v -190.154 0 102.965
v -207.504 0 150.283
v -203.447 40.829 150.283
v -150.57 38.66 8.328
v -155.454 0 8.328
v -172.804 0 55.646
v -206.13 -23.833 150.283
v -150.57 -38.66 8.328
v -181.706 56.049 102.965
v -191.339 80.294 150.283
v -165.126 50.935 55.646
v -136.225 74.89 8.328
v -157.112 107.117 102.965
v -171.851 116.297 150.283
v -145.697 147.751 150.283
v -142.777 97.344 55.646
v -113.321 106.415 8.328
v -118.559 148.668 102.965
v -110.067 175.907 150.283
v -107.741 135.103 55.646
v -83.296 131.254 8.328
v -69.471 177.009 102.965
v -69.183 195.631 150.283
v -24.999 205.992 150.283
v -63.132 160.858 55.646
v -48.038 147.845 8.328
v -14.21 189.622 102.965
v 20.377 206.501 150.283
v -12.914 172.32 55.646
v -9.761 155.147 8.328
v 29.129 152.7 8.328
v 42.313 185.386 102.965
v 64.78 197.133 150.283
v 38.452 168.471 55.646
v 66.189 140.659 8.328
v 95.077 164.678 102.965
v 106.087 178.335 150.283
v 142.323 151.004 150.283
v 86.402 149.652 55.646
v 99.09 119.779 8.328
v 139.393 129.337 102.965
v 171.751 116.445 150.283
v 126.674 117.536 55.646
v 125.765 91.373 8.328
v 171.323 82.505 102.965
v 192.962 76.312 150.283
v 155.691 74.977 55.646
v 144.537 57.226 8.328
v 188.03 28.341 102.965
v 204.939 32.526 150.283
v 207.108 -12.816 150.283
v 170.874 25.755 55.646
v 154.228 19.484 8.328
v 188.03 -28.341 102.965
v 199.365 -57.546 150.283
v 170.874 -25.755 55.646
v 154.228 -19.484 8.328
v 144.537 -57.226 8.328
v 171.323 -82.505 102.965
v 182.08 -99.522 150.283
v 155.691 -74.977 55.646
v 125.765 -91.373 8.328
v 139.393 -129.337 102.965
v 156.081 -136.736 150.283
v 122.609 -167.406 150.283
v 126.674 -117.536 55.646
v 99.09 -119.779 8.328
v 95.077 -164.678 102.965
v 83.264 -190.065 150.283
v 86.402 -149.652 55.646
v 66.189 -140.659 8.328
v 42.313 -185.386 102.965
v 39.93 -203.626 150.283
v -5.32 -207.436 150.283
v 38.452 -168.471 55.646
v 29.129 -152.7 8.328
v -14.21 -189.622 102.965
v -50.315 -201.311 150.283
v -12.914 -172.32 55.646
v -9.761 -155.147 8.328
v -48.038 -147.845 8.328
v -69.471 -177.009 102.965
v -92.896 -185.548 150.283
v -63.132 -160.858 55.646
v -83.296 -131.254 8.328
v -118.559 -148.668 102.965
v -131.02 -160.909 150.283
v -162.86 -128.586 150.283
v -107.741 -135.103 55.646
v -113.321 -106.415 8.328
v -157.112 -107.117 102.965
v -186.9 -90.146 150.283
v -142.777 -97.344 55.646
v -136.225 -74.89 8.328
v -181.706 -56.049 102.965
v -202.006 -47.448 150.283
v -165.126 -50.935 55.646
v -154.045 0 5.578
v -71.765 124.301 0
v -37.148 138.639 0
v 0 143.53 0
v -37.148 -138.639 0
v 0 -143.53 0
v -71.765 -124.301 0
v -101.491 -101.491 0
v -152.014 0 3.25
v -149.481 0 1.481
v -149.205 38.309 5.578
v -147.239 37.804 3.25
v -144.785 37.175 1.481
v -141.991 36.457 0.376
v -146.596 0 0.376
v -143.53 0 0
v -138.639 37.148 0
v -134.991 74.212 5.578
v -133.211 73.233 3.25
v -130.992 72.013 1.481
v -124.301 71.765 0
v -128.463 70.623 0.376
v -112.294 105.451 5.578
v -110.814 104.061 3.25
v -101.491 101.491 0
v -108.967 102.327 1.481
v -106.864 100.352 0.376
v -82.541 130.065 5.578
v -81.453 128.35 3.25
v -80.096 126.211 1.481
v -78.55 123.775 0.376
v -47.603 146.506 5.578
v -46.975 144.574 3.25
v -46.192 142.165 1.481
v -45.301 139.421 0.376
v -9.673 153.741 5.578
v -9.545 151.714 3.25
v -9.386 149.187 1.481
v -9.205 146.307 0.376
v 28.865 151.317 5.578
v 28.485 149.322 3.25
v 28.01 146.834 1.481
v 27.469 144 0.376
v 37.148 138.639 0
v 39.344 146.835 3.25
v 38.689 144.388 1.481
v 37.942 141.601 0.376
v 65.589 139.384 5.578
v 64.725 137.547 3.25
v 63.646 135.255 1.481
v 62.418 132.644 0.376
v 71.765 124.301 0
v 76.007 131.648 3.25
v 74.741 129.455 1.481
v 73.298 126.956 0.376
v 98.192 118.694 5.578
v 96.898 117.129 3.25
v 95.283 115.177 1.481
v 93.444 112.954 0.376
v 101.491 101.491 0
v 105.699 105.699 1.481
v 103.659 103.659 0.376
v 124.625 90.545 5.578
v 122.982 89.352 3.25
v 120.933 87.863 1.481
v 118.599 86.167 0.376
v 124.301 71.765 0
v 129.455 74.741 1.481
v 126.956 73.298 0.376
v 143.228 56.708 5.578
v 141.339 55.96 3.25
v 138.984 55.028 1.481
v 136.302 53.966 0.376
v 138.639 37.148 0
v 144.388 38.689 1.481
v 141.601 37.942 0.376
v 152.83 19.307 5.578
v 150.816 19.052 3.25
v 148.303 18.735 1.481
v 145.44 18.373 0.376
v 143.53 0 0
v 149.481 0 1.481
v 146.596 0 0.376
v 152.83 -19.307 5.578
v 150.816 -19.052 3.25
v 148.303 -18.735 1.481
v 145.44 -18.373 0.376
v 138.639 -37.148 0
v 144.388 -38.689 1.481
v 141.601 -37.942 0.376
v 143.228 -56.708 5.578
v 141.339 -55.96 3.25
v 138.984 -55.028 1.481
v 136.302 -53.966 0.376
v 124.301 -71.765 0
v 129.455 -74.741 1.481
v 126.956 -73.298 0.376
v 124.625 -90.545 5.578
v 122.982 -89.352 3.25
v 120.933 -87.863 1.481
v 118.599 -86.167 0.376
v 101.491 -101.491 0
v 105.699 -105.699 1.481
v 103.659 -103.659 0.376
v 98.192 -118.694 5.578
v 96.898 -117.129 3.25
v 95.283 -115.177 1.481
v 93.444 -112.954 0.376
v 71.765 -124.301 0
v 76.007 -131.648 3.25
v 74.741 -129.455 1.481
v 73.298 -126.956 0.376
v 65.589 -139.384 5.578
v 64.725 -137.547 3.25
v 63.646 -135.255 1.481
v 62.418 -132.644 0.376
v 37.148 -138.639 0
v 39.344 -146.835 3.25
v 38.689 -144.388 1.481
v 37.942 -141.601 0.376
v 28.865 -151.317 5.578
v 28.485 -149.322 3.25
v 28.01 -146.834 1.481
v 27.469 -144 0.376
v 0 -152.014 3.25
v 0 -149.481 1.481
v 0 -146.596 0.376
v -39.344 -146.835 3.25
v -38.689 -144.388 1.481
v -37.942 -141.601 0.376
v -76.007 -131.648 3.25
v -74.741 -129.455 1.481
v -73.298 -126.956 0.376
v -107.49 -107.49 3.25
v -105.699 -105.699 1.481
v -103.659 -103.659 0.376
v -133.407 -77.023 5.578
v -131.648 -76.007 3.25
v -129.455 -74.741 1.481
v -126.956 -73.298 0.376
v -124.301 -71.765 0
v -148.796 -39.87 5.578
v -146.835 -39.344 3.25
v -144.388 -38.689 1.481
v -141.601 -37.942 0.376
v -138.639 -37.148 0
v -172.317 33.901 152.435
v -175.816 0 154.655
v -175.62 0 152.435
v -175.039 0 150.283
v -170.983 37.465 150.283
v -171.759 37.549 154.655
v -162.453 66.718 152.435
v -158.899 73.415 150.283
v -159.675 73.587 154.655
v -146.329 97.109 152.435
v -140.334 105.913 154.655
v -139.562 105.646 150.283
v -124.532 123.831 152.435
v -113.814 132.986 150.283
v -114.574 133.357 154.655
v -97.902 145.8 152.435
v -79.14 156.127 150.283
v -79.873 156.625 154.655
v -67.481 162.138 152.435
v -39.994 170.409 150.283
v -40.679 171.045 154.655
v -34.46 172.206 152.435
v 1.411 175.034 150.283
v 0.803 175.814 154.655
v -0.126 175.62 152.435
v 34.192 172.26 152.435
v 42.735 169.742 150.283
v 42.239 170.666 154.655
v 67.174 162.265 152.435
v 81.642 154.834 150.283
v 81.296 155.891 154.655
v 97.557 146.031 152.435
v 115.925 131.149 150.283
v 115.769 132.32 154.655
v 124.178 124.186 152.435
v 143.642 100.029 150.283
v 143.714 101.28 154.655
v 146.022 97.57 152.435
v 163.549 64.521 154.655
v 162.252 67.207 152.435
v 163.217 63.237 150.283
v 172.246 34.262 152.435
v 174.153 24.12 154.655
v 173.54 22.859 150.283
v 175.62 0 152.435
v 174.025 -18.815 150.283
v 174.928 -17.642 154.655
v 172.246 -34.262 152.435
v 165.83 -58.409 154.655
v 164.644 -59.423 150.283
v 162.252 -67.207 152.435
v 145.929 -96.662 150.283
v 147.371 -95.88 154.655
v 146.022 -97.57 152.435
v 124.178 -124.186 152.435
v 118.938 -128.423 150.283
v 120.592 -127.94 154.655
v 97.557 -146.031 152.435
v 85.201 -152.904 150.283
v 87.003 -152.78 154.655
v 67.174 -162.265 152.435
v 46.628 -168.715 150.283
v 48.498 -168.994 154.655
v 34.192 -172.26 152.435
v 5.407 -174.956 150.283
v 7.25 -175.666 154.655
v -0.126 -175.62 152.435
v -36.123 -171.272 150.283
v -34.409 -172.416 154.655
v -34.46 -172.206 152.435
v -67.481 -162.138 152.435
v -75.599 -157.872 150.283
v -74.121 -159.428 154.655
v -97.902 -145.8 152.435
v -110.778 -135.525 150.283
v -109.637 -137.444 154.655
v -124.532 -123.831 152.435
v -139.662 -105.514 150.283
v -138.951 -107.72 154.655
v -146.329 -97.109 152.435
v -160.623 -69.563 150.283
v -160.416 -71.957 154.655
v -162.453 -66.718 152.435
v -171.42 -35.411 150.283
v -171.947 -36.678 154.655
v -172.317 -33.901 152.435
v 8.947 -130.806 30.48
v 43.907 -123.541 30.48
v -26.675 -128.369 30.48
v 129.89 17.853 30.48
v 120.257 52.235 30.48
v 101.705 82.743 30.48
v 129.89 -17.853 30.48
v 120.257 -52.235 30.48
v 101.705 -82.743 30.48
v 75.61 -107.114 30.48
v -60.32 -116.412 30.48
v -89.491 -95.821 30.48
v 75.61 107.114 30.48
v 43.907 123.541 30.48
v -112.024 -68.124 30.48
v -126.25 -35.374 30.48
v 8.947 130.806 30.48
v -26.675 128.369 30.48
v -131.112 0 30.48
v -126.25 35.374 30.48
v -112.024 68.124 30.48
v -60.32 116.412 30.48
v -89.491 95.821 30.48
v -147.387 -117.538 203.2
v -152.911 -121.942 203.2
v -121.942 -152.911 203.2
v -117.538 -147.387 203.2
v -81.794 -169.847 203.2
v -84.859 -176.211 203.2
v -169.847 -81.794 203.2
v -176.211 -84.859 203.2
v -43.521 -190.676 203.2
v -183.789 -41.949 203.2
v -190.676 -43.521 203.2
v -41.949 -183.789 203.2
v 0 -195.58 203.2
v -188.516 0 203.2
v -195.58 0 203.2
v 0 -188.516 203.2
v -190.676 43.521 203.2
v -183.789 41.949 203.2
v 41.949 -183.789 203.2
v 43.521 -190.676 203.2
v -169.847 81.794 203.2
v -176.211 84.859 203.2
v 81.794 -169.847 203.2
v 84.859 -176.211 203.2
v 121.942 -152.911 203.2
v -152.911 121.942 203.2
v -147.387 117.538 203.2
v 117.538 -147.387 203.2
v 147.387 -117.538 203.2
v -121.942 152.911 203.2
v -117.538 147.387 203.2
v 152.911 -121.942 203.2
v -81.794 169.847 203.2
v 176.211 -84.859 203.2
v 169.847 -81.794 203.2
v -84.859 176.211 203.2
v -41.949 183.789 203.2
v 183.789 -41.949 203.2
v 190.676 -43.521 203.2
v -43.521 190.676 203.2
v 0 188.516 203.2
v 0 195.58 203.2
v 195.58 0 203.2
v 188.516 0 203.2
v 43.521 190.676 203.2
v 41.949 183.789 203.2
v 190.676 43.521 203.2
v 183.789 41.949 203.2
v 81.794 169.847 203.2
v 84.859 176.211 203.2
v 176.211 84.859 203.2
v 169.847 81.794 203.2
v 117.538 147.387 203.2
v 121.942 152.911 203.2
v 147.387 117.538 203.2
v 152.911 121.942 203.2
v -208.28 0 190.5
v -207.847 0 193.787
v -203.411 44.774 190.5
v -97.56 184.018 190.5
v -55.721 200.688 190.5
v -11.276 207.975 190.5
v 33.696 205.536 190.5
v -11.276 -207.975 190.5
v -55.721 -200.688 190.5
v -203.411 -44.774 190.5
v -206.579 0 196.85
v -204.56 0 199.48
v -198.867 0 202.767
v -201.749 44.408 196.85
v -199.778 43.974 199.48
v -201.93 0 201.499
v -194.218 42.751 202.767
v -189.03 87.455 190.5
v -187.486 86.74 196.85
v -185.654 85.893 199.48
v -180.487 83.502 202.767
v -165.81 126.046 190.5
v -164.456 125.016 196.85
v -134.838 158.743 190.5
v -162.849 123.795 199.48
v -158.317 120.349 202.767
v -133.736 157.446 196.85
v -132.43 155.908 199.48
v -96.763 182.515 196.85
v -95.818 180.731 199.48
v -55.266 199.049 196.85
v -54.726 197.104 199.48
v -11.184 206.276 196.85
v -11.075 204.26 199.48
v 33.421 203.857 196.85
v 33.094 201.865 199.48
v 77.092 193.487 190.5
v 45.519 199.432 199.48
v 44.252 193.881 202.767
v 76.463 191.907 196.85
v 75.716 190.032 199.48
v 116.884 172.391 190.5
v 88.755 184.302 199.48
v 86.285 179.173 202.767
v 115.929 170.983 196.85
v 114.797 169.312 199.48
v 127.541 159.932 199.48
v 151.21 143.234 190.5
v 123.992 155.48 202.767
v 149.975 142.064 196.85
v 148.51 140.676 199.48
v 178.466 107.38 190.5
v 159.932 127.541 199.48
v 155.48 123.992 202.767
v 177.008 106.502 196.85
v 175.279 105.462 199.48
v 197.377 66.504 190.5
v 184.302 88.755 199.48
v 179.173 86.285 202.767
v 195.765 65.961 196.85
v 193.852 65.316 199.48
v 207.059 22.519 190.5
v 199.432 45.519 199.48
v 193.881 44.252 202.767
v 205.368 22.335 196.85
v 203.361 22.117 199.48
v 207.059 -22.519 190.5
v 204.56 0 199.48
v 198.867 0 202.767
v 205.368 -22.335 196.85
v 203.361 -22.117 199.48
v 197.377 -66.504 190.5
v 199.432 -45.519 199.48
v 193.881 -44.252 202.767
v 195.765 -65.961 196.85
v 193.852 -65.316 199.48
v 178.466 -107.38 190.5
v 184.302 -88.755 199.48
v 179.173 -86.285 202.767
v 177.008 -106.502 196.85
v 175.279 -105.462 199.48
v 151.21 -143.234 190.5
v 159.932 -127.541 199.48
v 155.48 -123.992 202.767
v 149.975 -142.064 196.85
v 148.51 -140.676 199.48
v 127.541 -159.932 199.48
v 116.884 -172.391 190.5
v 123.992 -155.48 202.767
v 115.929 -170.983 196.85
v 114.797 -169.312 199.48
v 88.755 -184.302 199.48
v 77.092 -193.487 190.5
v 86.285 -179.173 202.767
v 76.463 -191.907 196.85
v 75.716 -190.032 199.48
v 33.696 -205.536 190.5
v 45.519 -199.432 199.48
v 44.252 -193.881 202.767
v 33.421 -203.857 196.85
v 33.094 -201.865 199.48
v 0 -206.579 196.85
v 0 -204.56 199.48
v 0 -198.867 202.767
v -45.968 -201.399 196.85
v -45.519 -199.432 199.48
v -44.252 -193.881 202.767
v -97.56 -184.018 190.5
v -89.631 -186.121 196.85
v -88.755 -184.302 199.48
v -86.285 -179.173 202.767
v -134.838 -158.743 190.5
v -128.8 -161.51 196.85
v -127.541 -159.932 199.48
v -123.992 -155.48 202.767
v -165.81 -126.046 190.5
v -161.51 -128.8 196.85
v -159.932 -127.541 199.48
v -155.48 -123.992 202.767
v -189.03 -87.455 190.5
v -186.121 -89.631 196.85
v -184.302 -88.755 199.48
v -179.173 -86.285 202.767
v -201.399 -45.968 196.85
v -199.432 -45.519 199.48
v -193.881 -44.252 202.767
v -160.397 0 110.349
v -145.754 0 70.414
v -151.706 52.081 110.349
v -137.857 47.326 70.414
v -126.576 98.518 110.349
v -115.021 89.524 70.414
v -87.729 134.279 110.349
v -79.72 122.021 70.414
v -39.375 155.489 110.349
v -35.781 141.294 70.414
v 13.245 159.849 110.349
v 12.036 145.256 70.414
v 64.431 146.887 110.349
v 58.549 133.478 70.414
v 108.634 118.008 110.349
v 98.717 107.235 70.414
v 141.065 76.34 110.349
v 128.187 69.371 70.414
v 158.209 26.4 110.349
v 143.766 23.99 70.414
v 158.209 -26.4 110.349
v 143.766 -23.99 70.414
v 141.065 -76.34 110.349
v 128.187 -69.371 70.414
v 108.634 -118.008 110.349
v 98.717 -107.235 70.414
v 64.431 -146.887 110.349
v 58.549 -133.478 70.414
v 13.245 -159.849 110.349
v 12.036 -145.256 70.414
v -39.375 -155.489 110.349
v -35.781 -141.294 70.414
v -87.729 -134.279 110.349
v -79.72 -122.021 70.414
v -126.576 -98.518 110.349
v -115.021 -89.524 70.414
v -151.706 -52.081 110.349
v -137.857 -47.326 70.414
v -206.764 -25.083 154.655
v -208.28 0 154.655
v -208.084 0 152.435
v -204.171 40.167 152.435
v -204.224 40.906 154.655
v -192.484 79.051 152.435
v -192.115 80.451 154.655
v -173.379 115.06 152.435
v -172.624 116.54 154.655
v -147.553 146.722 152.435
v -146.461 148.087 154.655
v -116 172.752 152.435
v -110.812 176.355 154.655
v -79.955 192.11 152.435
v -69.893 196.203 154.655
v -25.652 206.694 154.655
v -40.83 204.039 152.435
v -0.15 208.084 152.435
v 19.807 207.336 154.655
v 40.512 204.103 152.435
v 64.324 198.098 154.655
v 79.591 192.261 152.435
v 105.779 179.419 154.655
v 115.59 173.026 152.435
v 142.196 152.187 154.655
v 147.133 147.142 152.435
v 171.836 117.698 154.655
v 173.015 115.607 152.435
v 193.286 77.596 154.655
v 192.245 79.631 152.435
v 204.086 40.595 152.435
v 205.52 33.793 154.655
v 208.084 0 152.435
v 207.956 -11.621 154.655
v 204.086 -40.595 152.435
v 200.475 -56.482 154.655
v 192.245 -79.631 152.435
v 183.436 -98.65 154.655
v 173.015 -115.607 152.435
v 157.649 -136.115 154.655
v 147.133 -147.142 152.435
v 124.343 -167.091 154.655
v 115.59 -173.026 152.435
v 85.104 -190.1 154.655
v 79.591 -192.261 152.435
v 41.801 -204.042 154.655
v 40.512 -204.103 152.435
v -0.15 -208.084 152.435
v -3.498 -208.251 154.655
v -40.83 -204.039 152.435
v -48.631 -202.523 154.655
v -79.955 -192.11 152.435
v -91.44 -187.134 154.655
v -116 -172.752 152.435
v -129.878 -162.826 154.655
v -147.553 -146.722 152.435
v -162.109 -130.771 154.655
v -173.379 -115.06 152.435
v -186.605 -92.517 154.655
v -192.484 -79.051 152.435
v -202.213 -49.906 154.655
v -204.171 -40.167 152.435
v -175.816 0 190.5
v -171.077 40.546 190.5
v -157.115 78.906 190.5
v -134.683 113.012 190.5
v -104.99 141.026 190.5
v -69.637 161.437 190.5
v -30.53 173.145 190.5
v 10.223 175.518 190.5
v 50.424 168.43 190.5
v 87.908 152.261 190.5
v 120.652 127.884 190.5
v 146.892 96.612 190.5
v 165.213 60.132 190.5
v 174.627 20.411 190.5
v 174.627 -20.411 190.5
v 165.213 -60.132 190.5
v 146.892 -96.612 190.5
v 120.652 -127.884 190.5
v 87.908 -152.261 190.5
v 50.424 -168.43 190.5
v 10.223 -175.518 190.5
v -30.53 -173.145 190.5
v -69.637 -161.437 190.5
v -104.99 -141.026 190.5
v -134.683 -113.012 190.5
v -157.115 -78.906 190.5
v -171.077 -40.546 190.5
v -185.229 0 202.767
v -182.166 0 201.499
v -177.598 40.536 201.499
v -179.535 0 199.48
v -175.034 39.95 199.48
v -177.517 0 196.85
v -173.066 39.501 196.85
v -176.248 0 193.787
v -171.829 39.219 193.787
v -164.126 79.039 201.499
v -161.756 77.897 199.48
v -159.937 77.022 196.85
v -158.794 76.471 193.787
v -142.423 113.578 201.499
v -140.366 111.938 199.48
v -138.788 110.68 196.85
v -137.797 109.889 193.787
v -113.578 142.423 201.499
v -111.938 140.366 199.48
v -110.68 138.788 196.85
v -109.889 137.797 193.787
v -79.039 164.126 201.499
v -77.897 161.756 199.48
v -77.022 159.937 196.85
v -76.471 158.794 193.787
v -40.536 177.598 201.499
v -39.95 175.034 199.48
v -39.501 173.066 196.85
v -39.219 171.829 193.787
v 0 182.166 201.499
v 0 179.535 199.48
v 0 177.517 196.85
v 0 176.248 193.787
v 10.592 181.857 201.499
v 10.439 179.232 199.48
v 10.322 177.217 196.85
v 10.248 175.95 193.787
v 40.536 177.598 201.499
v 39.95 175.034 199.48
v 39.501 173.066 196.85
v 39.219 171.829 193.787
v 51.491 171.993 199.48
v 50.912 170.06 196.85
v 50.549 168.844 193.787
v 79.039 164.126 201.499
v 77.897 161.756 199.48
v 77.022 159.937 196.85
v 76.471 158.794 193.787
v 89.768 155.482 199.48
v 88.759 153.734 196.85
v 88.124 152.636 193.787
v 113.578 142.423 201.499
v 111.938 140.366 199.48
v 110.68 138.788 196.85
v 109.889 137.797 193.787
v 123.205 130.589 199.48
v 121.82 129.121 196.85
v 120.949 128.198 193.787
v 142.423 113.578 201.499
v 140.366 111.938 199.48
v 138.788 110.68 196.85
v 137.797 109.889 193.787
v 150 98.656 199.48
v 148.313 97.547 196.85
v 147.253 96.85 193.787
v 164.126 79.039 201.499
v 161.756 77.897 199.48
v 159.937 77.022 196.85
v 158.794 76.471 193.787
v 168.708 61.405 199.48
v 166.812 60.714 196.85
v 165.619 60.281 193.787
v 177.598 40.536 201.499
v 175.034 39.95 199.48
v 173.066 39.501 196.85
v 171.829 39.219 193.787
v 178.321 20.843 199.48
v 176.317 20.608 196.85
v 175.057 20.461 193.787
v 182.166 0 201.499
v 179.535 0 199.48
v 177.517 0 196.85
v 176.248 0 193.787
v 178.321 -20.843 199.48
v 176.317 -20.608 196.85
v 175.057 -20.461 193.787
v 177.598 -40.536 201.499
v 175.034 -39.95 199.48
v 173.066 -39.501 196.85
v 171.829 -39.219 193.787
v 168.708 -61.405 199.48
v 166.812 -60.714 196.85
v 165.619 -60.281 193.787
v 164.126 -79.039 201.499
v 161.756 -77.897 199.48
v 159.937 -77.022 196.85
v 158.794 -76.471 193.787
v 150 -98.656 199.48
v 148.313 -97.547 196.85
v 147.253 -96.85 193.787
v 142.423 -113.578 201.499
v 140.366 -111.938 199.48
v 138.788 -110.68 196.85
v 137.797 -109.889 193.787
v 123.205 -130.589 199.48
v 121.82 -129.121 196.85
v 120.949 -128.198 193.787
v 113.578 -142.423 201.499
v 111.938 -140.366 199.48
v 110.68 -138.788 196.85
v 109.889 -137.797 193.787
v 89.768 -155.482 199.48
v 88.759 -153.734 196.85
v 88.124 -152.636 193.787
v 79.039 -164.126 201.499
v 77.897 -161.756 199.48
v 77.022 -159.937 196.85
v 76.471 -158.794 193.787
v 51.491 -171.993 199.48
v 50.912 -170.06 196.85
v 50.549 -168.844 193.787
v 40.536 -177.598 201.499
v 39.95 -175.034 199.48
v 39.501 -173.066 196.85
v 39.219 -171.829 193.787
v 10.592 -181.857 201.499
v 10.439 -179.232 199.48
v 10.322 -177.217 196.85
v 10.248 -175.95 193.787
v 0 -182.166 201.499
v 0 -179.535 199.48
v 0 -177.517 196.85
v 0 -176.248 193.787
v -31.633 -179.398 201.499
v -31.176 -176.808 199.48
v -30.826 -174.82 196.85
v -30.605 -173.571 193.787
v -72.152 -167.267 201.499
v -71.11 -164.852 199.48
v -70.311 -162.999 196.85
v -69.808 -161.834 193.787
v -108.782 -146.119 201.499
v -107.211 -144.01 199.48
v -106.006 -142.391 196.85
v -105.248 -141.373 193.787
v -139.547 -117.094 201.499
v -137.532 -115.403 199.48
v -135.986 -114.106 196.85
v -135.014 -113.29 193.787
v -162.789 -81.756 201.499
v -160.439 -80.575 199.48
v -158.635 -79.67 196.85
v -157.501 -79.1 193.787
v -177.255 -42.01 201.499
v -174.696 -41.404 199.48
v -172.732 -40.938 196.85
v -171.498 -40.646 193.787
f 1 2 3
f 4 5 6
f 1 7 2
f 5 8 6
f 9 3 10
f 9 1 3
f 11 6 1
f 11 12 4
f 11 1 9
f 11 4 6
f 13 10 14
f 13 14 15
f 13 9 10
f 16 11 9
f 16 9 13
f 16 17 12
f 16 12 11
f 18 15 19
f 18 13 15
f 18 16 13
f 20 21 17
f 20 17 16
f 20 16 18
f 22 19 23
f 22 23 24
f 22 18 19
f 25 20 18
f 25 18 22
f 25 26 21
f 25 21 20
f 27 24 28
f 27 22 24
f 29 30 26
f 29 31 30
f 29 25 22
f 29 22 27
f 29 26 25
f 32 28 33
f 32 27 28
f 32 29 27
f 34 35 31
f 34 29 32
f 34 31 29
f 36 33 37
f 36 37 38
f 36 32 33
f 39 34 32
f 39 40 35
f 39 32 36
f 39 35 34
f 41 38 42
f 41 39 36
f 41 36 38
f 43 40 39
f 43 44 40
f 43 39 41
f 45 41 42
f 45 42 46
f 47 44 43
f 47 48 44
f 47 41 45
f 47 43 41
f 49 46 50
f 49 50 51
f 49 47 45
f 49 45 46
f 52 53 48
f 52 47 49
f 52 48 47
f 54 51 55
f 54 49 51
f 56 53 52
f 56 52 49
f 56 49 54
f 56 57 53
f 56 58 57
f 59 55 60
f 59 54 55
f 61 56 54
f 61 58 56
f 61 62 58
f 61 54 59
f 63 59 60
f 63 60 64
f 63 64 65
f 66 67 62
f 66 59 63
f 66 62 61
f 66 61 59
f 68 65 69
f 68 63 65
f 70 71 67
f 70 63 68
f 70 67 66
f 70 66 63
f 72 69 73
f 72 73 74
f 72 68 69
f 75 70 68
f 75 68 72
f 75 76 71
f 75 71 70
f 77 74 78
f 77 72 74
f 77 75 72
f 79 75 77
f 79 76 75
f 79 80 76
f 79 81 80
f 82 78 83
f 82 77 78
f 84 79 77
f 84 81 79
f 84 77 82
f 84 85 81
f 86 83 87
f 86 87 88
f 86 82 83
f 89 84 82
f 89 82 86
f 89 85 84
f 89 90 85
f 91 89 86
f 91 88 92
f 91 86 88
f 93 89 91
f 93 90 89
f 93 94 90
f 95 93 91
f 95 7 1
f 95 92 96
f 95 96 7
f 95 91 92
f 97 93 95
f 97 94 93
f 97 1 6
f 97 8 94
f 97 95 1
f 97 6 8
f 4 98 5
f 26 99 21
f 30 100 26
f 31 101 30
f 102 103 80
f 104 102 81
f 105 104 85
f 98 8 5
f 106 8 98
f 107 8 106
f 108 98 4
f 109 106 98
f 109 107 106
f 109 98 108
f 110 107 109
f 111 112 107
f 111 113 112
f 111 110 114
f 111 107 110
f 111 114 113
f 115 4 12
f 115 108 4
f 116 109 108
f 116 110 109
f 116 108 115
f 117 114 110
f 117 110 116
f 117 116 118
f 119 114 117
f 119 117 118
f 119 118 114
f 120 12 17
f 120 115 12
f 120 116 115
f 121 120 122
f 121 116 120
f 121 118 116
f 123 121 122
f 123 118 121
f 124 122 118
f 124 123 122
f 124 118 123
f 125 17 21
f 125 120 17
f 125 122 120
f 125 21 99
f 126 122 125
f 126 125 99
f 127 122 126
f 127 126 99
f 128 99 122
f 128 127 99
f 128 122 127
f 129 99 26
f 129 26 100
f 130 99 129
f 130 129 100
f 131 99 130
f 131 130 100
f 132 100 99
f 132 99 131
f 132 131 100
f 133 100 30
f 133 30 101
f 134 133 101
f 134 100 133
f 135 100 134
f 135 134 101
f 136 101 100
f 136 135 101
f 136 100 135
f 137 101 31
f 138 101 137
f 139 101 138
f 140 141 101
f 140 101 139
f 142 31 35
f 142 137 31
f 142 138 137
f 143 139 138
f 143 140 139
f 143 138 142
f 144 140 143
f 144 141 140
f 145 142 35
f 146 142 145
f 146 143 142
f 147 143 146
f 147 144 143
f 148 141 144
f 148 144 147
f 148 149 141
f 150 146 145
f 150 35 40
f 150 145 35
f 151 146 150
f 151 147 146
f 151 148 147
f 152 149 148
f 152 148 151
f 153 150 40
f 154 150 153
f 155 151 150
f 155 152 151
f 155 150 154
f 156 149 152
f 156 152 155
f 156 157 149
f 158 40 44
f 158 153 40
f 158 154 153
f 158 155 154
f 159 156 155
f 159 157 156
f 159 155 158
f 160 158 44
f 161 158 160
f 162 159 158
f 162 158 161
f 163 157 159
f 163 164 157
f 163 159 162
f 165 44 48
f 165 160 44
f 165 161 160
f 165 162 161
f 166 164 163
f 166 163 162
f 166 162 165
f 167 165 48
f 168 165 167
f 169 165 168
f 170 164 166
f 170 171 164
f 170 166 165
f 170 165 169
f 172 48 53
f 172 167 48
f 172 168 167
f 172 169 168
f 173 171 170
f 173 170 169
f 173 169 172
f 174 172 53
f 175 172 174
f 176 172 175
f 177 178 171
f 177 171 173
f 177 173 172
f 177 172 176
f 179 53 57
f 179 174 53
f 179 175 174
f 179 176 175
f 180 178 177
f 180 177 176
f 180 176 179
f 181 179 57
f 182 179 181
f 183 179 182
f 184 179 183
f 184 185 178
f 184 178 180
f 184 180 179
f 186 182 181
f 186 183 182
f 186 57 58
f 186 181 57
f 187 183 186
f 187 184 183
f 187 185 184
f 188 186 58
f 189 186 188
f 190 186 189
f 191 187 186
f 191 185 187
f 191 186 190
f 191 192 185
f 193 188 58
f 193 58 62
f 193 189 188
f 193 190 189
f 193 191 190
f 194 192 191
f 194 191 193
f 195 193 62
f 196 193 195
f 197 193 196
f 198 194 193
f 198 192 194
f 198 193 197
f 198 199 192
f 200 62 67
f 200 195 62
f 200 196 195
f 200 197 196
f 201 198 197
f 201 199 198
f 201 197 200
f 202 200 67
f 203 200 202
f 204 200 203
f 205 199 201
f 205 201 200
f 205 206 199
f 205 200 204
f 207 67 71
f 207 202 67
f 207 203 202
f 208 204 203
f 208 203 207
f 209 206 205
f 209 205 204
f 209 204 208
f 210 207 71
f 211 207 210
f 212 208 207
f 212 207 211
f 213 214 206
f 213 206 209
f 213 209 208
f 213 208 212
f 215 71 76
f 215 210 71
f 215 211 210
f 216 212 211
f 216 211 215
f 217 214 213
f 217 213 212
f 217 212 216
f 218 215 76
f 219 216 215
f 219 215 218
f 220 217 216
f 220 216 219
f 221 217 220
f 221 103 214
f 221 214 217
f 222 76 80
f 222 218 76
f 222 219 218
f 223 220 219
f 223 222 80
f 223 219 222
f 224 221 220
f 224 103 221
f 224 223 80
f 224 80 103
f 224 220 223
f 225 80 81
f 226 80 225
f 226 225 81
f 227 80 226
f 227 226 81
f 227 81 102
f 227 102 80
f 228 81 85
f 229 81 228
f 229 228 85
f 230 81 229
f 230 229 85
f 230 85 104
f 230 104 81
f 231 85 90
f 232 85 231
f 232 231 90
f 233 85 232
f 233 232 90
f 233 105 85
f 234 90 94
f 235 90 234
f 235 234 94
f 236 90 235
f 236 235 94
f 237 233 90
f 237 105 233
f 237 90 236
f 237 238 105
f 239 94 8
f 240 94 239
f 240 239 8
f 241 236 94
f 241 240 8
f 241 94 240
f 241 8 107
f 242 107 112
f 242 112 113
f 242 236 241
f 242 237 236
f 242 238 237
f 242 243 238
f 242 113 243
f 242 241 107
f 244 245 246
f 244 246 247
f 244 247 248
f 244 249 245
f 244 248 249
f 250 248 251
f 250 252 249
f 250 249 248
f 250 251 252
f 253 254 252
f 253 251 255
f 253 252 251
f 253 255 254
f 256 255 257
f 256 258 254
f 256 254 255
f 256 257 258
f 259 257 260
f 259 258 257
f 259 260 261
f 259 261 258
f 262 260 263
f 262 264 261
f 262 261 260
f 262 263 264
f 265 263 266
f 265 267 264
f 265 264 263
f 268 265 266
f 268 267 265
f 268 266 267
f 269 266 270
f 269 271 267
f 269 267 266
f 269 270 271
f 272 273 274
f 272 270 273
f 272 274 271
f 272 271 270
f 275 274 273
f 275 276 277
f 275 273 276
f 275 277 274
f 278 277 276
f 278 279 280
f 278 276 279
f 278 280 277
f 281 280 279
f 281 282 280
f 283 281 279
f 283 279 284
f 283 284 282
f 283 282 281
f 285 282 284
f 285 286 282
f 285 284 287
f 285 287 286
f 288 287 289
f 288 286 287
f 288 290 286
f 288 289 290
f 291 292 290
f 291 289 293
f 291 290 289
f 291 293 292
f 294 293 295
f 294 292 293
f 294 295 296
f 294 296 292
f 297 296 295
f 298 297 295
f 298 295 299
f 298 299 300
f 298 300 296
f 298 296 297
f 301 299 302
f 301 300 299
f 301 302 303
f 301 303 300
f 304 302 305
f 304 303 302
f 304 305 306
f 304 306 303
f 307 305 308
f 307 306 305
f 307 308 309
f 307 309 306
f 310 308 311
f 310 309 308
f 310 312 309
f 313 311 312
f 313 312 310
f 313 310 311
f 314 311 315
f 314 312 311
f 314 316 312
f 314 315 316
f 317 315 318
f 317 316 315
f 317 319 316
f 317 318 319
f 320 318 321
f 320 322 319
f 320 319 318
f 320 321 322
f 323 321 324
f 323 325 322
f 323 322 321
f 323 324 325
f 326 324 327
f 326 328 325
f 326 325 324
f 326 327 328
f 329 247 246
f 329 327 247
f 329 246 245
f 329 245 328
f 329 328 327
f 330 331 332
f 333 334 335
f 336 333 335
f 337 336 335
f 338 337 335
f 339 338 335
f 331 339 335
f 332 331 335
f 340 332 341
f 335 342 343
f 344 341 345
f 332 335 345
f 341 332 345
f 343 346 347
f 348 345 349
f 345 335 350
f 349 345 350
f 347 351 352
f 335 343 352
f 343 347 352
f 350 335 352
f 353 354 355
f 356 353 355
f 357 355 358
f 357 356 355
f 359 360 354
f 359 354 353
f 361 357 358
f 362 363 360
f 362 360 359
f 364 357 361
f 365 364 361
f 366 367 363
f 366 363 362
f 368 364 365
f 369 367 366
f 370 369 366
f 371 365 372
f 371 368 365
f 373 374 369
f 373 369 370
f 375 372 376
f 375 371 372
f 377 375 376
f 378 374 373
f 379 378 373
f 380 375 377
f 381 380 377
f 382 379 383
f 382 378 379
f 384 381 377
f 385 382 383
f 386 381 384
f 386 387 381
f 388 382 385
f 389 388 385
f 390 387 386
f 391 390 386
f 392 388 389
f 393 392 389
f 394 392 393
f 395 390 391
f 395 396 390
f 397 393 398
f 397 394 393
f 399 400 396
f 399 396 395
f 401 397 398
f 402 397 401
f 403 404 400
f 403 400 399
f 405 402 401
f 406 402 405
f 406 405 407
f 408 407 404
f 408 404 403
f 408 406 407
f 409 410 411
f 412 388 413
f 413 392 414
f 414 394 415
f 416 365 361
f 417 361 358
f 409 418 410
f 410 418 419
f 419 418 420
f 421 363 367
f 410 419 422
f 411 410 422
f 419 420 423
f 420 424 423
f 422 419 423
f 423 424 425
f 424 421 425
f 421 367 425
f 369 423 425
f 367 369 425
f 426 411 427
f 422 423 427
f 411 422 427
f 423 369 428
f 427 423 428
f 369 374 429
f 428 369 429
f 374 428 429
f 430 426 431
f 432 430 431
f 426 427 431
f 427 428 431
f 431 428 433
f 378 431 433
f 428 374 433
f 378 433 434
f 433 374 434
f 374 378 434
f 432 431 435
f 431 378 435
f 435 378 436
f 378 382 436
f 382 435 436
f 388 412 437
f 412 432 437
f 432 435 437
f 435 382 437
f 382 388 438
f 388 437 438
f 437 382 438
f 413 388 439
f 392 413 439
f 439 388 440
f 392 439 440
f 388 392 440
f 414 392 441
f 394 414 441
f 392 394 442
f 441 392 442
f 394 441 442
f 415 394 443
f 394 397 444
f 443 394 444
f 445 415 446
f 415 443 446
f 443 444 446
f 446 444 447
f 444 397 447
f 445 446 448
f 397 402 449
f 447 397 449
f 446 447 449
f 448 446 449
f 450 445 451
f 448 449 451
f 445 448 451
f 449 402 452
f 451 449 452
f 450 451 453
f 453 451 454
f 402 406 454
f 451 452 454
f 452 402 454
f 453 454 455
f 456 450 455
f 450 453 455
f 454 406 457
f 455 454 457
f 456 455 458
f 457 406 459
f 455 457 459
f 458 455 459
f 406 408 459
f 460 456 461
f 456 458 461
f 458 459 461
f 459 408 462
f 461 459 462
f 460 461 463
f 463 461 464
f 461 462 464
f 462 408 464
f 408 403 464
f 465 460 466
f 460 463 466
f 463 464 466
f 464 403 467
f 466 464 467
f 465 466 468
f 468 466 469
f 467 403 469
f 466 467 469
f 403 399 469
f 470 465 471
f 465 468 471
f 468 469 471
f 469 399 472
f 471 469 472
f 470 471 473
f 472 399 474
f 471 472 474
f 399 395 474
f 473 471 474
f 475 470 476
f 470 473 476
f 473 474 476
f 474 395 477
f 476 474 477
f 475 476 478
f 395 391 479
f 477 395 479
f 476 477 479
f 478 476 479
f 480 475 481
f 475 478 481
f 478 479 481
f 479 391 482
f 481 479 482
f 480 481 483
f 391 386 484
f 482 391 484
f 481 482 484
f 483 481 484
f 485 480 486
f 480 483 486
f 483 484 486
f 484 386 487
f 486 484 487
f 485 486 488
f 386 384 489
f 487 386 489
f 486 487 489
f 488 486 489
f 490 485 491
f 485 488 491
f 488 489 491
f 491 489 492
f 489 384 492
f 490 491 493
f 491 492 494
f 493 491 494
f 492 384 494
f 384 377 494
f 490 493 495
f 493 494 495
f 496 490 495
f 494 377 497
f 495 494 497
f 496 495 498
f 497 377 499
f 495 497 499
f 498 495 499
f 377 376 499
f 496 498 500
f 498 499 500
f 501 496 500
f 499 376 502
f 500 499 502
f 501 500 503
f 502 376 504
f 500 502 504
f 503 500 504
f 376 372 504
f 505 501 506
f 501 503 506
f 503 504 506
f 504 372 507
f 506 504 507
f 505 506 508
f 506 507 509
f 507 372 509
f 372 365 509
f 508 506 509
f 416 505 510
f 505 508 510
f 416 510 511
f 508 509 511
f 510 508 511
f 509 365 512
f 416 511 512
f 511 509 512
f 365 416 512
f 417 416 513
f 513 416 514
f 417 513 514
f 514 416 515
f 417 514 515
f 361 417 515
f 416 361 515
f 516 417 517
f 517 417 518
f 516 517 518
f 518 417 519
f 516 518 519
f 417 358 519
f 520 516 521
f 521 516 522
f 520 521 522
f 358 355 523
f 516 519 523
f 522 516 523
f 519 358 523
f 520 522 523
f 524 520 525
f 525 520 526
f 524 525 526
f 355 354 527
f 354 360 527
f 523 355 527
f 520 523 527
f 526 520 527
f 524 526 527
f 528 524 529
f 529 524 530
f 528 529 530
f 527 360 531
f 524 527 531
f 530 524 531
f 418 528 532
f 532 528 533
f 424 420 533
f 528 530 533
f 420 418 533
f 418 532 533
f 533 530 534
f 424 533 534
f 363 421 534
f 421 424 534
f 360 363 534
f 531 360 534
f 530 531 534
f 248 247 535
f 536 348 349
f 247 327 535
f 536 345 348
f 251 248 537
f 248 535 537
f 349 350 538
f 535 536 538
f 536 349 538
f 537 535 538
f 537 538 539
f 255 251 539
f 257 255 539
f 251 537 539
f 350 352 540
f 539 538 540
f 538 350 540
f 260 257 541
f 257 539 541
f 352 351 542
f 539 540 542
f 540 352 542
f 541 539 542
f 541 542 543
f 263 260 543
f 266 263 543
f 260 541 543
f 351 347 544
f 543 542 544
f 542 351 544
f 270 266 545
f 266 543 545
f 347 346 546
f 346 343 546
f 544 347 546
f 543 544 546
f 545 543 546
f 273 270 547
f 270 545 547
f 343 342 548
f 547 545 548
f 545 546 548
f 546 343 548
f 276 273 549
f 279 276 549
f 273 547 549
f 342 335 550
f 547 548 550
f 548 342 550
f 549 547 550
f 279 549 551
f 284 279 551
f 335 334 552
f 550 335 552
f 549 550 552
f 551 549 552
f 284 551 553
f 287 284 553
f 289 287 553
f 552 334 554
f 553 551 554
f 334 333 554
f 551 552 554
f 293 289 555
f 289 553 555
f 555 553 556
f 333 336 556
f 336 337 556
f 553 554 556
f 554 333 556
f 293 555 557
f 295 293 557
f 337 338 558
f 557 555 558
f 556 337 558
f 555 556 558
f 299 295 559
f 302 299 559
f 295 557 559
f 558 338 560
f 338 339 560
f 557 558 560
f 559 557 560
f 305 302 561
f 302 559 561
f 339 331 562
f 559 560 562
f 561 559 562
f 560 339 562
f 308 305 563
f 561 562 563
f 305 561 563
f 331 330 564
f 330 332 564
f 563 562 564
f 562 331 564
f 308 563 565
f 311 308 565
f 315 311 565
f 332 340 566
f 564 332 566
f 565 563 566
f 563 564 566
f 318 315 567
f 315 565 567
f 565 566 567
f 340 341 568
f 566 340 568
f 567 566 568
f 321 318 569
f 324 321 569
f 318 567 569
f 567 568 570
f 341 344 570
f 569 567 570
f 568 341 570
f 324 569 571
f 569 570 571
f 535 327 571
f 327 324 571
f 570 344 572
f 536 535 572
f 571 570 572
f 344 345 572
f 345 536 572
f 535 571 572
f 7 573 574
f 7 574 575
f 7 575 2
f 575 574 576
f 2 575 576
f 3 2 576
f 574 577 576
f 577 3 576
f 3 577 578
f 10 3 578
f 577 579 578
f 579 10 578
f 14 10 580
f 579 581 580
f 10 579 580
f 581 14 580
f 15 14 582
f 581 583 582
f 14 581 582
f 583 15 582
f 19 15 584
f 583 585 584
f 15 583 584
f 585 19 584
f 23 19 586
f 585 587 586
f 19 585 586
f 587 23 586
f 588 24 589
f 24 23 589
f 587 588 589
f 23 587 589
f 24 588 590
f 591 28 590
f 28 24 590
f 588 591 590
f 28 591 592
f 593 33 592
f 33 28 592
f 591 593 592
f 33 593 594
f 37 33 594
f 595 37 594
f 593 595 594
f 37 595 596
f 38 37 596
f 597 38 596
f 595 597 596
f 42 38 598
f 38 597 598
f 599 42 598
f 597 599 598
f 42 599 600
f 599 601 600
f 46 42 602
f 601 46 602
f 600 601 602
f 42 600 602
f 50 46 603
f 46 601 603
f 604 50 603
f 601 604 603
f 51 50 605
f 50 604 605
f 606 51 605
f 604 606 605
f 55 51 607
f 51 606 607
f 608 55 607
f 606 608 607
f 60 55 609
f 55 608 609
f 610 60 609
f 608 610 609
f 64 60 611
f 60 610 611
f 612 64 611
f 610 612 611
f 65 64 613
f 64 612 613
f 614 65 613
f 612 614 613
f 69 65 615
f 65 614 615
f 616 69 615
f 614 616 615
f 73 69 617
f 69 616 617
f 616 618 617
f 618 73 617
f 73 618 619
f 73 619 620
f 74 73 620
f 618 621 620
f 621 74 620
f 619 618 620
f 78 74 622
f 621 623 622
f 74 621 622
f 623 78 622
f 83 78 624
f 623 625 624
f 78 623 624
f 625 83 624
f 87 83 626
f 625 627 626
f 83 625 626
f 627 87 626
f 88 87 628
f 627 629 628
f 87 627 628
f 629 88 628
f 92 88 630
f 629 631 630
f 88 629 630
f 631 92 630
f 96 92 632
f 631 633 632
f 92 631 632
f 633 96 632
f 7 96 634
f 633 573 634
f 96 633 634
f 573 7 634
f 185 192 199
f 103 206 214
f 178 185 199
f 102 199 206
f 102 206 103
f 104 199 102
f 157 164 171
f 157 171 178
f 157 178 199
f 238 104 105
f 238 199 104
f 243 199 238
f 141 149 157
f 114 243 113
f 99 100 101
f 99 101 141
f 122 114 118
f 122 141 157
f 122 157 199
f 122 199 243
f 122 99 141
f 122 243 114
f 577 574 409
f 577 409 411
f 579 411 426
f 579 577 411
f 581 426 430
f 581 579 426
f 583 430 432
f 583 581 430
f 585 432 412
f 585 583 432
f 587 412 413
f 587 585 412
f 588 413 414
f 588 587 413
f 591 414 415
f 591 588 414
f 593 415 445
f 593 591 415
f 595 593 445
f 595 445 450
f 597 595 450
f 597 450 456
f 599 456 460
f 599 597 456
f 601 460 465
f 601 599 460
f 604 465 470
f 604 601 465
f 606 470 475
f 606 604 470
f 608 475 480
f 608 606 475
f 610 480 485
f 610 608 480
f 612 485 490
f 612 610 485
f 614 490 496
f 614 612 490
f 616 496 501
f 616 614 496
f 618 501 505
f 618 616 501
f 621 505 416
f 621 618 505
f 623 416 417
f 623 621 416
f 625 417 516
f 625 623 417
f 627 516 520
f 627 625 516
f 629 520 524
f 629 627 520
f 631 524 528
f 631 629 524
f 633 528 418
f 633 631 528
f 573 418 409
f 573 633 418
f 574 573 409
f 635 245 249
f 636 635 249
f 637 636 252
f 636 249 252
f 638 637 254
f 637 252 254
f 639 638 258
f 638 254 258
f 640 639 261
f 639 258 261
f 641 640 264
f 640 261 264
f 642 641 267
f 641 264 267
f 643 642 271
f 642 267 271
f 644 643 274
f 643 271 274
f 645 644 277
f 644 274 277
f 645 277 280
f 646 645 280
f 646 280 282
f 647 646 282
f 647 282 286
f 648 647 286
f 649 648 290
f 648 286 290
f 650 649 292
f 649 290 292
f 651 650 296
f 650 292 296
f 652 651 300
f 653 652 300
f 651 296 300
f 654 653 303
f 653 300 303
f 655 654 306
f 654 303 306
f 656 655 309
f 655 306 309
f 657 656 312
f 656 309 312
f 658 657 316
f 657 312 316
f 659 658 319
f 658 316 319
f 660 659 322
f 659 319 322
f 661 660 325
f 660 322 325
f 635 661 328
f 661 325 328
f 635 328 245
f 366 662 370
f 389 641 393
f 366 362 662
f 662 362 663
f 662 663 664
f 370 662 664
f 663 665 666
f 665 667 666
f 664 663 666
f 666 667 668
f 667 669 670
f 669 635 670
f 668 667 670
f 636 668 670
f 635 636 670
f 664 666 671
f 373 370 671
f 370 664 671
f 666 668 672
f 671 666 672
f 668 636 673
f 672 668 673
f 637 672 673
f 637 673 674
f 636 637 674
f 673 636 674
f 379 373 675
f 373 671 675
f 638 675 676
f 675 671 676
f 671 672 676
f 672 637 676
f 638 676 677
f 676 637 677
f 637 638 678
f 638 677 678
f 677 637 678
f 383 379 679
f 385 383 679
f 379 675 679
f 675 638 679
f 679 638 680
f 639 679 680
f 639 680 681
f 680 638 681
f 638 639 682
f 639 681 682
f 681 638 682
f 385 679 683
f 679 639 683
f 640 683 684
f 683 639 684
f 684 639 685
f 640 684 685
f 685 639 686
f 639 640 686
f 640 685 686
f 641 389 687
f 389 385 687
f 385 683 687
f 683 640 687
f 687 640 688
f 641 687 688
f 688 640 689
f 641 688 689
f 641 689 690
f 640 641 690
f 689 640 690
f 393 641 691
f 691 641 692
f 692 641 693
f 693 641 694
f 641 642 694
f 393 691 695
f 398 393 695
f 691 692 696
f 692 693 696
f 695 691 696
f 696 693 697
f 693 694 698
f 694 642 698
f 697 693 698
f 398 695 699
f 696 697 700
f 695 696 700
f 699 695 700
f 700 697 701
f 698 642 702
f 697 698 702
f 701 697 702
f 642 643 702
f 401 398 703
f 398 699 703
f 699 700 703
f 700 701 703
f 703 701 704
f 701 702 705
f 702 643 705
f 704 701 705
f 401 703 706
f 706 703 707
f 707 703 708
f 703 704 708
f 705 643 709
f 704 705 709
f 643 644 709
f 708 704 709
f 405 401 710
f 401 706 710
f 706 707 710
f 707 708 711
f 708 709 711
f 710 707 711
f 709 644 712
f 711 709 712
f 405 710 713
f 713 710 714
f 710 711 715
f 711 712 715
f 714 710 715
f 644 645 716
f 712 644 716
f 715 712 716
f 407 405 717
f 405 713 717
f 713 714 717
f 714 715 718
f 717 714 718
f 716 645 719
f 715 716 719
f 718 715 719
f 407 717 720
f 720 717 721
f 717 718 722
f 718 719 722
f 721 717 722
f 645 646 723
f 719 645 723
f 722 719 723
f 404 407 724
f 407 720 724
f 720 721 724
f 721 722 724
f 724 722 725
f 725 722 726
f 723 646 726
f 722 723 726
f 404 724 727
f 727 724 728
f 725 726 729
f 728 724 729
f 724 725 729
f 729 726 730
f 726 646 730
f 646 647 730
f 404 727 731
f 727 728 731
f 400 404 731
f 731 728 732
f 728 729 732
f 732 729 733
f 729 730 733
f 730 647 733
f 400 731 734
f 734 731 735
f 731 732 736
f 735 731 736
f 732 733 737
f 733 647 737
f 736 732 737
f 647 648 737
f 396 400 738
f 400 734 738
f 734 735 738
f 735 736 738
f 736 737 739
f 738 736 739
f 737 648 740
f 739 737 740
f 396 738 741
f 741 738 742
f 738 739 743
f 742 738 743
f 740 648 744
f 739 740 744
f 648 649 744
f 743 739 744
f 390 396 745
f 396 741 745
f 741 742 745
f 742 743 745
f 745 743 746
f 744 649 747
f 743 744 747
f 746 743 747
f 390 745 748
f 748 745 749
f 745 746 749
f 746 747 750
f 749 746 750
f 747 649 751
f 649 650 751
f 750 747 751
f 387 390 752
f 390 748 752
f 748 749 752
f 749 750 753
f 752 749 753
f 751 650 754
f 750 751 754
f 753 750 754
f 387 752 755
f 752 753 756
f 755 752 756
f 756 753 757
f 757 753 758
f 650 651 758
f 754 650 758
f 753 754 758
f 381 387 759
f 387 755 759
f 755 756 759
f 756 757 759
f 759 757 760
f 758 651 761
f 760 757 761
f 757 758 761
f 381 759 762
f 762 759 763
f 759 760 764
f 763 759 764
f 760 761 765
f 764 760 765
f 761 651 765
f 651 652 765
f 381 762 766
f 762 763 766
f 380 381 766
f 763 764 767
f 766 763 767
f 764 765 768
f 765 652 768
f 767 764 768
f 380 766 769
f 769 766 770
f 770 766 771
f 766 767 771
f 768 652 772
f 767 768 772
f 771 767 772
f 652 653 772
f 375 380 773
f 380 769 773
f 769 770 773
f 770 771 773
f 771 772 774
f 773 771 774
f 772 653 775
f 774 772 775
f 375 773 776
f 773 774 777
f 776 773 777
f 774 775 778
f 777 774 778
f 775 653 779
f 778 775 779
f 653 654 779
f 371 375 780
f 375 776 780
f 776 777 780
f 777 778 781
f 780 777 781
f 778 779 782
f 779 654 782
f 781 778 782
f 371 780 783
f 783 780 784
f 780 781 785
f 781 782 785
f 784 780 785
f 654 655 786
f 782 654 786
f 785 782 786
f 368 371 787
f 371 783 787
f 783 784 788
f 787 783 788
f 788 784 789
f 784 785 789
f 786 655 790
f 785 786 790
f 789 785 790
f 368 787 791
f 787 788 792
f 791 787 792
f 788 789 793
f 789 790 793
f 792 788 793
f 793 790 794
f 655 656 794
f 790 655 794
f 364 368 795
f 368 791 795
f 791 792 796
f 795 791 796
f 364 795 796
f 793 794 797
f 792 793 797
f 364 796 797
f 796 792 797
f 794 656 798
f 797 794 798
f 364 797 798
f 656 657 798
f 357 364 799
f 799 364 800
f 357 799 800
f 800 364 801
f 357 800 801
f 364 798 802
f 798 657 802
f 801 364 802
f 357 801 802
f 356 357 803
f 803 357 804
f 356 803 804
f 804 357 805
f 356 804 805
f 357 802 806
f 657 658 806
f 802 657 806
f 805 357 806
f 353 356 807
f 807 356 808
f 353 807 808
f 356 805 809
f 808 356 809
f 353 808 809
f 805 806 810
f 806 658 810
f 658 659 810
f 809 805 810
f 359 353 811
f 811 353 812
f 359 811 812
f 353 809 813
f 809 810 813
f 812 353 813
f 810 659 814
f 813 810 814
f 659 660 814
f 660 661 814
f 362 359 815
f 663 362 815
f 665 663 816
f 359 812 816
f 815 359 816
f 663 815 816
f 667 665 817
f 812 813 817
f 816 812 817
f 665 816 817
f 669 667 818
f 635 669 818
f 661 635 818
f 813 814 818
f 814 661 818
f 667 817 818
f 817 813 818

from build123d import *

# Parameters (mm, degrees)
F2_T     = -30.48
F3_DEPTH = 50.8
F4_R     = 12.7


with BuildPart() as f1:
    # F0 (on Front) → F1 (revolve)
    with BuildSketch(Plane.XZ):
        Polygon((-152.4, 0), (0, 0), (0, 152.4), (-208.28, 152.4), align=None)
    revolve(axis=Axis((0, 0, 76.2), (0, 0, -1)))

    # F2
    f2_openings = [f1.faces().sort_by_distance(p)[0] for p in [
        (0, 0, 152.4),
    ]]
    offset(amount=F2_T, openings=f2_openings)

    # F3 (add): a face of the model
    f3_faces = [f1.faces().sort_by_distance(p)[0] for p in [
        (202.3889519846, 0, 152.4),
    ]]
    extrude(f3_faces, amount=F3_DEPTH)

    # F4
    f4_edges = [f1.edges().sort_by_distance(p)[0] for p in [
        (208.28, 0, 203.2),
        (175.81566, 0, 203.2),
        (175.81566, 0, 152.4),
        (208.28, 0, 152.4),
        (152.4, 0, 0),
    ]]
    fillet(f4_edges, radius=F4_R)


solid = f1.part
